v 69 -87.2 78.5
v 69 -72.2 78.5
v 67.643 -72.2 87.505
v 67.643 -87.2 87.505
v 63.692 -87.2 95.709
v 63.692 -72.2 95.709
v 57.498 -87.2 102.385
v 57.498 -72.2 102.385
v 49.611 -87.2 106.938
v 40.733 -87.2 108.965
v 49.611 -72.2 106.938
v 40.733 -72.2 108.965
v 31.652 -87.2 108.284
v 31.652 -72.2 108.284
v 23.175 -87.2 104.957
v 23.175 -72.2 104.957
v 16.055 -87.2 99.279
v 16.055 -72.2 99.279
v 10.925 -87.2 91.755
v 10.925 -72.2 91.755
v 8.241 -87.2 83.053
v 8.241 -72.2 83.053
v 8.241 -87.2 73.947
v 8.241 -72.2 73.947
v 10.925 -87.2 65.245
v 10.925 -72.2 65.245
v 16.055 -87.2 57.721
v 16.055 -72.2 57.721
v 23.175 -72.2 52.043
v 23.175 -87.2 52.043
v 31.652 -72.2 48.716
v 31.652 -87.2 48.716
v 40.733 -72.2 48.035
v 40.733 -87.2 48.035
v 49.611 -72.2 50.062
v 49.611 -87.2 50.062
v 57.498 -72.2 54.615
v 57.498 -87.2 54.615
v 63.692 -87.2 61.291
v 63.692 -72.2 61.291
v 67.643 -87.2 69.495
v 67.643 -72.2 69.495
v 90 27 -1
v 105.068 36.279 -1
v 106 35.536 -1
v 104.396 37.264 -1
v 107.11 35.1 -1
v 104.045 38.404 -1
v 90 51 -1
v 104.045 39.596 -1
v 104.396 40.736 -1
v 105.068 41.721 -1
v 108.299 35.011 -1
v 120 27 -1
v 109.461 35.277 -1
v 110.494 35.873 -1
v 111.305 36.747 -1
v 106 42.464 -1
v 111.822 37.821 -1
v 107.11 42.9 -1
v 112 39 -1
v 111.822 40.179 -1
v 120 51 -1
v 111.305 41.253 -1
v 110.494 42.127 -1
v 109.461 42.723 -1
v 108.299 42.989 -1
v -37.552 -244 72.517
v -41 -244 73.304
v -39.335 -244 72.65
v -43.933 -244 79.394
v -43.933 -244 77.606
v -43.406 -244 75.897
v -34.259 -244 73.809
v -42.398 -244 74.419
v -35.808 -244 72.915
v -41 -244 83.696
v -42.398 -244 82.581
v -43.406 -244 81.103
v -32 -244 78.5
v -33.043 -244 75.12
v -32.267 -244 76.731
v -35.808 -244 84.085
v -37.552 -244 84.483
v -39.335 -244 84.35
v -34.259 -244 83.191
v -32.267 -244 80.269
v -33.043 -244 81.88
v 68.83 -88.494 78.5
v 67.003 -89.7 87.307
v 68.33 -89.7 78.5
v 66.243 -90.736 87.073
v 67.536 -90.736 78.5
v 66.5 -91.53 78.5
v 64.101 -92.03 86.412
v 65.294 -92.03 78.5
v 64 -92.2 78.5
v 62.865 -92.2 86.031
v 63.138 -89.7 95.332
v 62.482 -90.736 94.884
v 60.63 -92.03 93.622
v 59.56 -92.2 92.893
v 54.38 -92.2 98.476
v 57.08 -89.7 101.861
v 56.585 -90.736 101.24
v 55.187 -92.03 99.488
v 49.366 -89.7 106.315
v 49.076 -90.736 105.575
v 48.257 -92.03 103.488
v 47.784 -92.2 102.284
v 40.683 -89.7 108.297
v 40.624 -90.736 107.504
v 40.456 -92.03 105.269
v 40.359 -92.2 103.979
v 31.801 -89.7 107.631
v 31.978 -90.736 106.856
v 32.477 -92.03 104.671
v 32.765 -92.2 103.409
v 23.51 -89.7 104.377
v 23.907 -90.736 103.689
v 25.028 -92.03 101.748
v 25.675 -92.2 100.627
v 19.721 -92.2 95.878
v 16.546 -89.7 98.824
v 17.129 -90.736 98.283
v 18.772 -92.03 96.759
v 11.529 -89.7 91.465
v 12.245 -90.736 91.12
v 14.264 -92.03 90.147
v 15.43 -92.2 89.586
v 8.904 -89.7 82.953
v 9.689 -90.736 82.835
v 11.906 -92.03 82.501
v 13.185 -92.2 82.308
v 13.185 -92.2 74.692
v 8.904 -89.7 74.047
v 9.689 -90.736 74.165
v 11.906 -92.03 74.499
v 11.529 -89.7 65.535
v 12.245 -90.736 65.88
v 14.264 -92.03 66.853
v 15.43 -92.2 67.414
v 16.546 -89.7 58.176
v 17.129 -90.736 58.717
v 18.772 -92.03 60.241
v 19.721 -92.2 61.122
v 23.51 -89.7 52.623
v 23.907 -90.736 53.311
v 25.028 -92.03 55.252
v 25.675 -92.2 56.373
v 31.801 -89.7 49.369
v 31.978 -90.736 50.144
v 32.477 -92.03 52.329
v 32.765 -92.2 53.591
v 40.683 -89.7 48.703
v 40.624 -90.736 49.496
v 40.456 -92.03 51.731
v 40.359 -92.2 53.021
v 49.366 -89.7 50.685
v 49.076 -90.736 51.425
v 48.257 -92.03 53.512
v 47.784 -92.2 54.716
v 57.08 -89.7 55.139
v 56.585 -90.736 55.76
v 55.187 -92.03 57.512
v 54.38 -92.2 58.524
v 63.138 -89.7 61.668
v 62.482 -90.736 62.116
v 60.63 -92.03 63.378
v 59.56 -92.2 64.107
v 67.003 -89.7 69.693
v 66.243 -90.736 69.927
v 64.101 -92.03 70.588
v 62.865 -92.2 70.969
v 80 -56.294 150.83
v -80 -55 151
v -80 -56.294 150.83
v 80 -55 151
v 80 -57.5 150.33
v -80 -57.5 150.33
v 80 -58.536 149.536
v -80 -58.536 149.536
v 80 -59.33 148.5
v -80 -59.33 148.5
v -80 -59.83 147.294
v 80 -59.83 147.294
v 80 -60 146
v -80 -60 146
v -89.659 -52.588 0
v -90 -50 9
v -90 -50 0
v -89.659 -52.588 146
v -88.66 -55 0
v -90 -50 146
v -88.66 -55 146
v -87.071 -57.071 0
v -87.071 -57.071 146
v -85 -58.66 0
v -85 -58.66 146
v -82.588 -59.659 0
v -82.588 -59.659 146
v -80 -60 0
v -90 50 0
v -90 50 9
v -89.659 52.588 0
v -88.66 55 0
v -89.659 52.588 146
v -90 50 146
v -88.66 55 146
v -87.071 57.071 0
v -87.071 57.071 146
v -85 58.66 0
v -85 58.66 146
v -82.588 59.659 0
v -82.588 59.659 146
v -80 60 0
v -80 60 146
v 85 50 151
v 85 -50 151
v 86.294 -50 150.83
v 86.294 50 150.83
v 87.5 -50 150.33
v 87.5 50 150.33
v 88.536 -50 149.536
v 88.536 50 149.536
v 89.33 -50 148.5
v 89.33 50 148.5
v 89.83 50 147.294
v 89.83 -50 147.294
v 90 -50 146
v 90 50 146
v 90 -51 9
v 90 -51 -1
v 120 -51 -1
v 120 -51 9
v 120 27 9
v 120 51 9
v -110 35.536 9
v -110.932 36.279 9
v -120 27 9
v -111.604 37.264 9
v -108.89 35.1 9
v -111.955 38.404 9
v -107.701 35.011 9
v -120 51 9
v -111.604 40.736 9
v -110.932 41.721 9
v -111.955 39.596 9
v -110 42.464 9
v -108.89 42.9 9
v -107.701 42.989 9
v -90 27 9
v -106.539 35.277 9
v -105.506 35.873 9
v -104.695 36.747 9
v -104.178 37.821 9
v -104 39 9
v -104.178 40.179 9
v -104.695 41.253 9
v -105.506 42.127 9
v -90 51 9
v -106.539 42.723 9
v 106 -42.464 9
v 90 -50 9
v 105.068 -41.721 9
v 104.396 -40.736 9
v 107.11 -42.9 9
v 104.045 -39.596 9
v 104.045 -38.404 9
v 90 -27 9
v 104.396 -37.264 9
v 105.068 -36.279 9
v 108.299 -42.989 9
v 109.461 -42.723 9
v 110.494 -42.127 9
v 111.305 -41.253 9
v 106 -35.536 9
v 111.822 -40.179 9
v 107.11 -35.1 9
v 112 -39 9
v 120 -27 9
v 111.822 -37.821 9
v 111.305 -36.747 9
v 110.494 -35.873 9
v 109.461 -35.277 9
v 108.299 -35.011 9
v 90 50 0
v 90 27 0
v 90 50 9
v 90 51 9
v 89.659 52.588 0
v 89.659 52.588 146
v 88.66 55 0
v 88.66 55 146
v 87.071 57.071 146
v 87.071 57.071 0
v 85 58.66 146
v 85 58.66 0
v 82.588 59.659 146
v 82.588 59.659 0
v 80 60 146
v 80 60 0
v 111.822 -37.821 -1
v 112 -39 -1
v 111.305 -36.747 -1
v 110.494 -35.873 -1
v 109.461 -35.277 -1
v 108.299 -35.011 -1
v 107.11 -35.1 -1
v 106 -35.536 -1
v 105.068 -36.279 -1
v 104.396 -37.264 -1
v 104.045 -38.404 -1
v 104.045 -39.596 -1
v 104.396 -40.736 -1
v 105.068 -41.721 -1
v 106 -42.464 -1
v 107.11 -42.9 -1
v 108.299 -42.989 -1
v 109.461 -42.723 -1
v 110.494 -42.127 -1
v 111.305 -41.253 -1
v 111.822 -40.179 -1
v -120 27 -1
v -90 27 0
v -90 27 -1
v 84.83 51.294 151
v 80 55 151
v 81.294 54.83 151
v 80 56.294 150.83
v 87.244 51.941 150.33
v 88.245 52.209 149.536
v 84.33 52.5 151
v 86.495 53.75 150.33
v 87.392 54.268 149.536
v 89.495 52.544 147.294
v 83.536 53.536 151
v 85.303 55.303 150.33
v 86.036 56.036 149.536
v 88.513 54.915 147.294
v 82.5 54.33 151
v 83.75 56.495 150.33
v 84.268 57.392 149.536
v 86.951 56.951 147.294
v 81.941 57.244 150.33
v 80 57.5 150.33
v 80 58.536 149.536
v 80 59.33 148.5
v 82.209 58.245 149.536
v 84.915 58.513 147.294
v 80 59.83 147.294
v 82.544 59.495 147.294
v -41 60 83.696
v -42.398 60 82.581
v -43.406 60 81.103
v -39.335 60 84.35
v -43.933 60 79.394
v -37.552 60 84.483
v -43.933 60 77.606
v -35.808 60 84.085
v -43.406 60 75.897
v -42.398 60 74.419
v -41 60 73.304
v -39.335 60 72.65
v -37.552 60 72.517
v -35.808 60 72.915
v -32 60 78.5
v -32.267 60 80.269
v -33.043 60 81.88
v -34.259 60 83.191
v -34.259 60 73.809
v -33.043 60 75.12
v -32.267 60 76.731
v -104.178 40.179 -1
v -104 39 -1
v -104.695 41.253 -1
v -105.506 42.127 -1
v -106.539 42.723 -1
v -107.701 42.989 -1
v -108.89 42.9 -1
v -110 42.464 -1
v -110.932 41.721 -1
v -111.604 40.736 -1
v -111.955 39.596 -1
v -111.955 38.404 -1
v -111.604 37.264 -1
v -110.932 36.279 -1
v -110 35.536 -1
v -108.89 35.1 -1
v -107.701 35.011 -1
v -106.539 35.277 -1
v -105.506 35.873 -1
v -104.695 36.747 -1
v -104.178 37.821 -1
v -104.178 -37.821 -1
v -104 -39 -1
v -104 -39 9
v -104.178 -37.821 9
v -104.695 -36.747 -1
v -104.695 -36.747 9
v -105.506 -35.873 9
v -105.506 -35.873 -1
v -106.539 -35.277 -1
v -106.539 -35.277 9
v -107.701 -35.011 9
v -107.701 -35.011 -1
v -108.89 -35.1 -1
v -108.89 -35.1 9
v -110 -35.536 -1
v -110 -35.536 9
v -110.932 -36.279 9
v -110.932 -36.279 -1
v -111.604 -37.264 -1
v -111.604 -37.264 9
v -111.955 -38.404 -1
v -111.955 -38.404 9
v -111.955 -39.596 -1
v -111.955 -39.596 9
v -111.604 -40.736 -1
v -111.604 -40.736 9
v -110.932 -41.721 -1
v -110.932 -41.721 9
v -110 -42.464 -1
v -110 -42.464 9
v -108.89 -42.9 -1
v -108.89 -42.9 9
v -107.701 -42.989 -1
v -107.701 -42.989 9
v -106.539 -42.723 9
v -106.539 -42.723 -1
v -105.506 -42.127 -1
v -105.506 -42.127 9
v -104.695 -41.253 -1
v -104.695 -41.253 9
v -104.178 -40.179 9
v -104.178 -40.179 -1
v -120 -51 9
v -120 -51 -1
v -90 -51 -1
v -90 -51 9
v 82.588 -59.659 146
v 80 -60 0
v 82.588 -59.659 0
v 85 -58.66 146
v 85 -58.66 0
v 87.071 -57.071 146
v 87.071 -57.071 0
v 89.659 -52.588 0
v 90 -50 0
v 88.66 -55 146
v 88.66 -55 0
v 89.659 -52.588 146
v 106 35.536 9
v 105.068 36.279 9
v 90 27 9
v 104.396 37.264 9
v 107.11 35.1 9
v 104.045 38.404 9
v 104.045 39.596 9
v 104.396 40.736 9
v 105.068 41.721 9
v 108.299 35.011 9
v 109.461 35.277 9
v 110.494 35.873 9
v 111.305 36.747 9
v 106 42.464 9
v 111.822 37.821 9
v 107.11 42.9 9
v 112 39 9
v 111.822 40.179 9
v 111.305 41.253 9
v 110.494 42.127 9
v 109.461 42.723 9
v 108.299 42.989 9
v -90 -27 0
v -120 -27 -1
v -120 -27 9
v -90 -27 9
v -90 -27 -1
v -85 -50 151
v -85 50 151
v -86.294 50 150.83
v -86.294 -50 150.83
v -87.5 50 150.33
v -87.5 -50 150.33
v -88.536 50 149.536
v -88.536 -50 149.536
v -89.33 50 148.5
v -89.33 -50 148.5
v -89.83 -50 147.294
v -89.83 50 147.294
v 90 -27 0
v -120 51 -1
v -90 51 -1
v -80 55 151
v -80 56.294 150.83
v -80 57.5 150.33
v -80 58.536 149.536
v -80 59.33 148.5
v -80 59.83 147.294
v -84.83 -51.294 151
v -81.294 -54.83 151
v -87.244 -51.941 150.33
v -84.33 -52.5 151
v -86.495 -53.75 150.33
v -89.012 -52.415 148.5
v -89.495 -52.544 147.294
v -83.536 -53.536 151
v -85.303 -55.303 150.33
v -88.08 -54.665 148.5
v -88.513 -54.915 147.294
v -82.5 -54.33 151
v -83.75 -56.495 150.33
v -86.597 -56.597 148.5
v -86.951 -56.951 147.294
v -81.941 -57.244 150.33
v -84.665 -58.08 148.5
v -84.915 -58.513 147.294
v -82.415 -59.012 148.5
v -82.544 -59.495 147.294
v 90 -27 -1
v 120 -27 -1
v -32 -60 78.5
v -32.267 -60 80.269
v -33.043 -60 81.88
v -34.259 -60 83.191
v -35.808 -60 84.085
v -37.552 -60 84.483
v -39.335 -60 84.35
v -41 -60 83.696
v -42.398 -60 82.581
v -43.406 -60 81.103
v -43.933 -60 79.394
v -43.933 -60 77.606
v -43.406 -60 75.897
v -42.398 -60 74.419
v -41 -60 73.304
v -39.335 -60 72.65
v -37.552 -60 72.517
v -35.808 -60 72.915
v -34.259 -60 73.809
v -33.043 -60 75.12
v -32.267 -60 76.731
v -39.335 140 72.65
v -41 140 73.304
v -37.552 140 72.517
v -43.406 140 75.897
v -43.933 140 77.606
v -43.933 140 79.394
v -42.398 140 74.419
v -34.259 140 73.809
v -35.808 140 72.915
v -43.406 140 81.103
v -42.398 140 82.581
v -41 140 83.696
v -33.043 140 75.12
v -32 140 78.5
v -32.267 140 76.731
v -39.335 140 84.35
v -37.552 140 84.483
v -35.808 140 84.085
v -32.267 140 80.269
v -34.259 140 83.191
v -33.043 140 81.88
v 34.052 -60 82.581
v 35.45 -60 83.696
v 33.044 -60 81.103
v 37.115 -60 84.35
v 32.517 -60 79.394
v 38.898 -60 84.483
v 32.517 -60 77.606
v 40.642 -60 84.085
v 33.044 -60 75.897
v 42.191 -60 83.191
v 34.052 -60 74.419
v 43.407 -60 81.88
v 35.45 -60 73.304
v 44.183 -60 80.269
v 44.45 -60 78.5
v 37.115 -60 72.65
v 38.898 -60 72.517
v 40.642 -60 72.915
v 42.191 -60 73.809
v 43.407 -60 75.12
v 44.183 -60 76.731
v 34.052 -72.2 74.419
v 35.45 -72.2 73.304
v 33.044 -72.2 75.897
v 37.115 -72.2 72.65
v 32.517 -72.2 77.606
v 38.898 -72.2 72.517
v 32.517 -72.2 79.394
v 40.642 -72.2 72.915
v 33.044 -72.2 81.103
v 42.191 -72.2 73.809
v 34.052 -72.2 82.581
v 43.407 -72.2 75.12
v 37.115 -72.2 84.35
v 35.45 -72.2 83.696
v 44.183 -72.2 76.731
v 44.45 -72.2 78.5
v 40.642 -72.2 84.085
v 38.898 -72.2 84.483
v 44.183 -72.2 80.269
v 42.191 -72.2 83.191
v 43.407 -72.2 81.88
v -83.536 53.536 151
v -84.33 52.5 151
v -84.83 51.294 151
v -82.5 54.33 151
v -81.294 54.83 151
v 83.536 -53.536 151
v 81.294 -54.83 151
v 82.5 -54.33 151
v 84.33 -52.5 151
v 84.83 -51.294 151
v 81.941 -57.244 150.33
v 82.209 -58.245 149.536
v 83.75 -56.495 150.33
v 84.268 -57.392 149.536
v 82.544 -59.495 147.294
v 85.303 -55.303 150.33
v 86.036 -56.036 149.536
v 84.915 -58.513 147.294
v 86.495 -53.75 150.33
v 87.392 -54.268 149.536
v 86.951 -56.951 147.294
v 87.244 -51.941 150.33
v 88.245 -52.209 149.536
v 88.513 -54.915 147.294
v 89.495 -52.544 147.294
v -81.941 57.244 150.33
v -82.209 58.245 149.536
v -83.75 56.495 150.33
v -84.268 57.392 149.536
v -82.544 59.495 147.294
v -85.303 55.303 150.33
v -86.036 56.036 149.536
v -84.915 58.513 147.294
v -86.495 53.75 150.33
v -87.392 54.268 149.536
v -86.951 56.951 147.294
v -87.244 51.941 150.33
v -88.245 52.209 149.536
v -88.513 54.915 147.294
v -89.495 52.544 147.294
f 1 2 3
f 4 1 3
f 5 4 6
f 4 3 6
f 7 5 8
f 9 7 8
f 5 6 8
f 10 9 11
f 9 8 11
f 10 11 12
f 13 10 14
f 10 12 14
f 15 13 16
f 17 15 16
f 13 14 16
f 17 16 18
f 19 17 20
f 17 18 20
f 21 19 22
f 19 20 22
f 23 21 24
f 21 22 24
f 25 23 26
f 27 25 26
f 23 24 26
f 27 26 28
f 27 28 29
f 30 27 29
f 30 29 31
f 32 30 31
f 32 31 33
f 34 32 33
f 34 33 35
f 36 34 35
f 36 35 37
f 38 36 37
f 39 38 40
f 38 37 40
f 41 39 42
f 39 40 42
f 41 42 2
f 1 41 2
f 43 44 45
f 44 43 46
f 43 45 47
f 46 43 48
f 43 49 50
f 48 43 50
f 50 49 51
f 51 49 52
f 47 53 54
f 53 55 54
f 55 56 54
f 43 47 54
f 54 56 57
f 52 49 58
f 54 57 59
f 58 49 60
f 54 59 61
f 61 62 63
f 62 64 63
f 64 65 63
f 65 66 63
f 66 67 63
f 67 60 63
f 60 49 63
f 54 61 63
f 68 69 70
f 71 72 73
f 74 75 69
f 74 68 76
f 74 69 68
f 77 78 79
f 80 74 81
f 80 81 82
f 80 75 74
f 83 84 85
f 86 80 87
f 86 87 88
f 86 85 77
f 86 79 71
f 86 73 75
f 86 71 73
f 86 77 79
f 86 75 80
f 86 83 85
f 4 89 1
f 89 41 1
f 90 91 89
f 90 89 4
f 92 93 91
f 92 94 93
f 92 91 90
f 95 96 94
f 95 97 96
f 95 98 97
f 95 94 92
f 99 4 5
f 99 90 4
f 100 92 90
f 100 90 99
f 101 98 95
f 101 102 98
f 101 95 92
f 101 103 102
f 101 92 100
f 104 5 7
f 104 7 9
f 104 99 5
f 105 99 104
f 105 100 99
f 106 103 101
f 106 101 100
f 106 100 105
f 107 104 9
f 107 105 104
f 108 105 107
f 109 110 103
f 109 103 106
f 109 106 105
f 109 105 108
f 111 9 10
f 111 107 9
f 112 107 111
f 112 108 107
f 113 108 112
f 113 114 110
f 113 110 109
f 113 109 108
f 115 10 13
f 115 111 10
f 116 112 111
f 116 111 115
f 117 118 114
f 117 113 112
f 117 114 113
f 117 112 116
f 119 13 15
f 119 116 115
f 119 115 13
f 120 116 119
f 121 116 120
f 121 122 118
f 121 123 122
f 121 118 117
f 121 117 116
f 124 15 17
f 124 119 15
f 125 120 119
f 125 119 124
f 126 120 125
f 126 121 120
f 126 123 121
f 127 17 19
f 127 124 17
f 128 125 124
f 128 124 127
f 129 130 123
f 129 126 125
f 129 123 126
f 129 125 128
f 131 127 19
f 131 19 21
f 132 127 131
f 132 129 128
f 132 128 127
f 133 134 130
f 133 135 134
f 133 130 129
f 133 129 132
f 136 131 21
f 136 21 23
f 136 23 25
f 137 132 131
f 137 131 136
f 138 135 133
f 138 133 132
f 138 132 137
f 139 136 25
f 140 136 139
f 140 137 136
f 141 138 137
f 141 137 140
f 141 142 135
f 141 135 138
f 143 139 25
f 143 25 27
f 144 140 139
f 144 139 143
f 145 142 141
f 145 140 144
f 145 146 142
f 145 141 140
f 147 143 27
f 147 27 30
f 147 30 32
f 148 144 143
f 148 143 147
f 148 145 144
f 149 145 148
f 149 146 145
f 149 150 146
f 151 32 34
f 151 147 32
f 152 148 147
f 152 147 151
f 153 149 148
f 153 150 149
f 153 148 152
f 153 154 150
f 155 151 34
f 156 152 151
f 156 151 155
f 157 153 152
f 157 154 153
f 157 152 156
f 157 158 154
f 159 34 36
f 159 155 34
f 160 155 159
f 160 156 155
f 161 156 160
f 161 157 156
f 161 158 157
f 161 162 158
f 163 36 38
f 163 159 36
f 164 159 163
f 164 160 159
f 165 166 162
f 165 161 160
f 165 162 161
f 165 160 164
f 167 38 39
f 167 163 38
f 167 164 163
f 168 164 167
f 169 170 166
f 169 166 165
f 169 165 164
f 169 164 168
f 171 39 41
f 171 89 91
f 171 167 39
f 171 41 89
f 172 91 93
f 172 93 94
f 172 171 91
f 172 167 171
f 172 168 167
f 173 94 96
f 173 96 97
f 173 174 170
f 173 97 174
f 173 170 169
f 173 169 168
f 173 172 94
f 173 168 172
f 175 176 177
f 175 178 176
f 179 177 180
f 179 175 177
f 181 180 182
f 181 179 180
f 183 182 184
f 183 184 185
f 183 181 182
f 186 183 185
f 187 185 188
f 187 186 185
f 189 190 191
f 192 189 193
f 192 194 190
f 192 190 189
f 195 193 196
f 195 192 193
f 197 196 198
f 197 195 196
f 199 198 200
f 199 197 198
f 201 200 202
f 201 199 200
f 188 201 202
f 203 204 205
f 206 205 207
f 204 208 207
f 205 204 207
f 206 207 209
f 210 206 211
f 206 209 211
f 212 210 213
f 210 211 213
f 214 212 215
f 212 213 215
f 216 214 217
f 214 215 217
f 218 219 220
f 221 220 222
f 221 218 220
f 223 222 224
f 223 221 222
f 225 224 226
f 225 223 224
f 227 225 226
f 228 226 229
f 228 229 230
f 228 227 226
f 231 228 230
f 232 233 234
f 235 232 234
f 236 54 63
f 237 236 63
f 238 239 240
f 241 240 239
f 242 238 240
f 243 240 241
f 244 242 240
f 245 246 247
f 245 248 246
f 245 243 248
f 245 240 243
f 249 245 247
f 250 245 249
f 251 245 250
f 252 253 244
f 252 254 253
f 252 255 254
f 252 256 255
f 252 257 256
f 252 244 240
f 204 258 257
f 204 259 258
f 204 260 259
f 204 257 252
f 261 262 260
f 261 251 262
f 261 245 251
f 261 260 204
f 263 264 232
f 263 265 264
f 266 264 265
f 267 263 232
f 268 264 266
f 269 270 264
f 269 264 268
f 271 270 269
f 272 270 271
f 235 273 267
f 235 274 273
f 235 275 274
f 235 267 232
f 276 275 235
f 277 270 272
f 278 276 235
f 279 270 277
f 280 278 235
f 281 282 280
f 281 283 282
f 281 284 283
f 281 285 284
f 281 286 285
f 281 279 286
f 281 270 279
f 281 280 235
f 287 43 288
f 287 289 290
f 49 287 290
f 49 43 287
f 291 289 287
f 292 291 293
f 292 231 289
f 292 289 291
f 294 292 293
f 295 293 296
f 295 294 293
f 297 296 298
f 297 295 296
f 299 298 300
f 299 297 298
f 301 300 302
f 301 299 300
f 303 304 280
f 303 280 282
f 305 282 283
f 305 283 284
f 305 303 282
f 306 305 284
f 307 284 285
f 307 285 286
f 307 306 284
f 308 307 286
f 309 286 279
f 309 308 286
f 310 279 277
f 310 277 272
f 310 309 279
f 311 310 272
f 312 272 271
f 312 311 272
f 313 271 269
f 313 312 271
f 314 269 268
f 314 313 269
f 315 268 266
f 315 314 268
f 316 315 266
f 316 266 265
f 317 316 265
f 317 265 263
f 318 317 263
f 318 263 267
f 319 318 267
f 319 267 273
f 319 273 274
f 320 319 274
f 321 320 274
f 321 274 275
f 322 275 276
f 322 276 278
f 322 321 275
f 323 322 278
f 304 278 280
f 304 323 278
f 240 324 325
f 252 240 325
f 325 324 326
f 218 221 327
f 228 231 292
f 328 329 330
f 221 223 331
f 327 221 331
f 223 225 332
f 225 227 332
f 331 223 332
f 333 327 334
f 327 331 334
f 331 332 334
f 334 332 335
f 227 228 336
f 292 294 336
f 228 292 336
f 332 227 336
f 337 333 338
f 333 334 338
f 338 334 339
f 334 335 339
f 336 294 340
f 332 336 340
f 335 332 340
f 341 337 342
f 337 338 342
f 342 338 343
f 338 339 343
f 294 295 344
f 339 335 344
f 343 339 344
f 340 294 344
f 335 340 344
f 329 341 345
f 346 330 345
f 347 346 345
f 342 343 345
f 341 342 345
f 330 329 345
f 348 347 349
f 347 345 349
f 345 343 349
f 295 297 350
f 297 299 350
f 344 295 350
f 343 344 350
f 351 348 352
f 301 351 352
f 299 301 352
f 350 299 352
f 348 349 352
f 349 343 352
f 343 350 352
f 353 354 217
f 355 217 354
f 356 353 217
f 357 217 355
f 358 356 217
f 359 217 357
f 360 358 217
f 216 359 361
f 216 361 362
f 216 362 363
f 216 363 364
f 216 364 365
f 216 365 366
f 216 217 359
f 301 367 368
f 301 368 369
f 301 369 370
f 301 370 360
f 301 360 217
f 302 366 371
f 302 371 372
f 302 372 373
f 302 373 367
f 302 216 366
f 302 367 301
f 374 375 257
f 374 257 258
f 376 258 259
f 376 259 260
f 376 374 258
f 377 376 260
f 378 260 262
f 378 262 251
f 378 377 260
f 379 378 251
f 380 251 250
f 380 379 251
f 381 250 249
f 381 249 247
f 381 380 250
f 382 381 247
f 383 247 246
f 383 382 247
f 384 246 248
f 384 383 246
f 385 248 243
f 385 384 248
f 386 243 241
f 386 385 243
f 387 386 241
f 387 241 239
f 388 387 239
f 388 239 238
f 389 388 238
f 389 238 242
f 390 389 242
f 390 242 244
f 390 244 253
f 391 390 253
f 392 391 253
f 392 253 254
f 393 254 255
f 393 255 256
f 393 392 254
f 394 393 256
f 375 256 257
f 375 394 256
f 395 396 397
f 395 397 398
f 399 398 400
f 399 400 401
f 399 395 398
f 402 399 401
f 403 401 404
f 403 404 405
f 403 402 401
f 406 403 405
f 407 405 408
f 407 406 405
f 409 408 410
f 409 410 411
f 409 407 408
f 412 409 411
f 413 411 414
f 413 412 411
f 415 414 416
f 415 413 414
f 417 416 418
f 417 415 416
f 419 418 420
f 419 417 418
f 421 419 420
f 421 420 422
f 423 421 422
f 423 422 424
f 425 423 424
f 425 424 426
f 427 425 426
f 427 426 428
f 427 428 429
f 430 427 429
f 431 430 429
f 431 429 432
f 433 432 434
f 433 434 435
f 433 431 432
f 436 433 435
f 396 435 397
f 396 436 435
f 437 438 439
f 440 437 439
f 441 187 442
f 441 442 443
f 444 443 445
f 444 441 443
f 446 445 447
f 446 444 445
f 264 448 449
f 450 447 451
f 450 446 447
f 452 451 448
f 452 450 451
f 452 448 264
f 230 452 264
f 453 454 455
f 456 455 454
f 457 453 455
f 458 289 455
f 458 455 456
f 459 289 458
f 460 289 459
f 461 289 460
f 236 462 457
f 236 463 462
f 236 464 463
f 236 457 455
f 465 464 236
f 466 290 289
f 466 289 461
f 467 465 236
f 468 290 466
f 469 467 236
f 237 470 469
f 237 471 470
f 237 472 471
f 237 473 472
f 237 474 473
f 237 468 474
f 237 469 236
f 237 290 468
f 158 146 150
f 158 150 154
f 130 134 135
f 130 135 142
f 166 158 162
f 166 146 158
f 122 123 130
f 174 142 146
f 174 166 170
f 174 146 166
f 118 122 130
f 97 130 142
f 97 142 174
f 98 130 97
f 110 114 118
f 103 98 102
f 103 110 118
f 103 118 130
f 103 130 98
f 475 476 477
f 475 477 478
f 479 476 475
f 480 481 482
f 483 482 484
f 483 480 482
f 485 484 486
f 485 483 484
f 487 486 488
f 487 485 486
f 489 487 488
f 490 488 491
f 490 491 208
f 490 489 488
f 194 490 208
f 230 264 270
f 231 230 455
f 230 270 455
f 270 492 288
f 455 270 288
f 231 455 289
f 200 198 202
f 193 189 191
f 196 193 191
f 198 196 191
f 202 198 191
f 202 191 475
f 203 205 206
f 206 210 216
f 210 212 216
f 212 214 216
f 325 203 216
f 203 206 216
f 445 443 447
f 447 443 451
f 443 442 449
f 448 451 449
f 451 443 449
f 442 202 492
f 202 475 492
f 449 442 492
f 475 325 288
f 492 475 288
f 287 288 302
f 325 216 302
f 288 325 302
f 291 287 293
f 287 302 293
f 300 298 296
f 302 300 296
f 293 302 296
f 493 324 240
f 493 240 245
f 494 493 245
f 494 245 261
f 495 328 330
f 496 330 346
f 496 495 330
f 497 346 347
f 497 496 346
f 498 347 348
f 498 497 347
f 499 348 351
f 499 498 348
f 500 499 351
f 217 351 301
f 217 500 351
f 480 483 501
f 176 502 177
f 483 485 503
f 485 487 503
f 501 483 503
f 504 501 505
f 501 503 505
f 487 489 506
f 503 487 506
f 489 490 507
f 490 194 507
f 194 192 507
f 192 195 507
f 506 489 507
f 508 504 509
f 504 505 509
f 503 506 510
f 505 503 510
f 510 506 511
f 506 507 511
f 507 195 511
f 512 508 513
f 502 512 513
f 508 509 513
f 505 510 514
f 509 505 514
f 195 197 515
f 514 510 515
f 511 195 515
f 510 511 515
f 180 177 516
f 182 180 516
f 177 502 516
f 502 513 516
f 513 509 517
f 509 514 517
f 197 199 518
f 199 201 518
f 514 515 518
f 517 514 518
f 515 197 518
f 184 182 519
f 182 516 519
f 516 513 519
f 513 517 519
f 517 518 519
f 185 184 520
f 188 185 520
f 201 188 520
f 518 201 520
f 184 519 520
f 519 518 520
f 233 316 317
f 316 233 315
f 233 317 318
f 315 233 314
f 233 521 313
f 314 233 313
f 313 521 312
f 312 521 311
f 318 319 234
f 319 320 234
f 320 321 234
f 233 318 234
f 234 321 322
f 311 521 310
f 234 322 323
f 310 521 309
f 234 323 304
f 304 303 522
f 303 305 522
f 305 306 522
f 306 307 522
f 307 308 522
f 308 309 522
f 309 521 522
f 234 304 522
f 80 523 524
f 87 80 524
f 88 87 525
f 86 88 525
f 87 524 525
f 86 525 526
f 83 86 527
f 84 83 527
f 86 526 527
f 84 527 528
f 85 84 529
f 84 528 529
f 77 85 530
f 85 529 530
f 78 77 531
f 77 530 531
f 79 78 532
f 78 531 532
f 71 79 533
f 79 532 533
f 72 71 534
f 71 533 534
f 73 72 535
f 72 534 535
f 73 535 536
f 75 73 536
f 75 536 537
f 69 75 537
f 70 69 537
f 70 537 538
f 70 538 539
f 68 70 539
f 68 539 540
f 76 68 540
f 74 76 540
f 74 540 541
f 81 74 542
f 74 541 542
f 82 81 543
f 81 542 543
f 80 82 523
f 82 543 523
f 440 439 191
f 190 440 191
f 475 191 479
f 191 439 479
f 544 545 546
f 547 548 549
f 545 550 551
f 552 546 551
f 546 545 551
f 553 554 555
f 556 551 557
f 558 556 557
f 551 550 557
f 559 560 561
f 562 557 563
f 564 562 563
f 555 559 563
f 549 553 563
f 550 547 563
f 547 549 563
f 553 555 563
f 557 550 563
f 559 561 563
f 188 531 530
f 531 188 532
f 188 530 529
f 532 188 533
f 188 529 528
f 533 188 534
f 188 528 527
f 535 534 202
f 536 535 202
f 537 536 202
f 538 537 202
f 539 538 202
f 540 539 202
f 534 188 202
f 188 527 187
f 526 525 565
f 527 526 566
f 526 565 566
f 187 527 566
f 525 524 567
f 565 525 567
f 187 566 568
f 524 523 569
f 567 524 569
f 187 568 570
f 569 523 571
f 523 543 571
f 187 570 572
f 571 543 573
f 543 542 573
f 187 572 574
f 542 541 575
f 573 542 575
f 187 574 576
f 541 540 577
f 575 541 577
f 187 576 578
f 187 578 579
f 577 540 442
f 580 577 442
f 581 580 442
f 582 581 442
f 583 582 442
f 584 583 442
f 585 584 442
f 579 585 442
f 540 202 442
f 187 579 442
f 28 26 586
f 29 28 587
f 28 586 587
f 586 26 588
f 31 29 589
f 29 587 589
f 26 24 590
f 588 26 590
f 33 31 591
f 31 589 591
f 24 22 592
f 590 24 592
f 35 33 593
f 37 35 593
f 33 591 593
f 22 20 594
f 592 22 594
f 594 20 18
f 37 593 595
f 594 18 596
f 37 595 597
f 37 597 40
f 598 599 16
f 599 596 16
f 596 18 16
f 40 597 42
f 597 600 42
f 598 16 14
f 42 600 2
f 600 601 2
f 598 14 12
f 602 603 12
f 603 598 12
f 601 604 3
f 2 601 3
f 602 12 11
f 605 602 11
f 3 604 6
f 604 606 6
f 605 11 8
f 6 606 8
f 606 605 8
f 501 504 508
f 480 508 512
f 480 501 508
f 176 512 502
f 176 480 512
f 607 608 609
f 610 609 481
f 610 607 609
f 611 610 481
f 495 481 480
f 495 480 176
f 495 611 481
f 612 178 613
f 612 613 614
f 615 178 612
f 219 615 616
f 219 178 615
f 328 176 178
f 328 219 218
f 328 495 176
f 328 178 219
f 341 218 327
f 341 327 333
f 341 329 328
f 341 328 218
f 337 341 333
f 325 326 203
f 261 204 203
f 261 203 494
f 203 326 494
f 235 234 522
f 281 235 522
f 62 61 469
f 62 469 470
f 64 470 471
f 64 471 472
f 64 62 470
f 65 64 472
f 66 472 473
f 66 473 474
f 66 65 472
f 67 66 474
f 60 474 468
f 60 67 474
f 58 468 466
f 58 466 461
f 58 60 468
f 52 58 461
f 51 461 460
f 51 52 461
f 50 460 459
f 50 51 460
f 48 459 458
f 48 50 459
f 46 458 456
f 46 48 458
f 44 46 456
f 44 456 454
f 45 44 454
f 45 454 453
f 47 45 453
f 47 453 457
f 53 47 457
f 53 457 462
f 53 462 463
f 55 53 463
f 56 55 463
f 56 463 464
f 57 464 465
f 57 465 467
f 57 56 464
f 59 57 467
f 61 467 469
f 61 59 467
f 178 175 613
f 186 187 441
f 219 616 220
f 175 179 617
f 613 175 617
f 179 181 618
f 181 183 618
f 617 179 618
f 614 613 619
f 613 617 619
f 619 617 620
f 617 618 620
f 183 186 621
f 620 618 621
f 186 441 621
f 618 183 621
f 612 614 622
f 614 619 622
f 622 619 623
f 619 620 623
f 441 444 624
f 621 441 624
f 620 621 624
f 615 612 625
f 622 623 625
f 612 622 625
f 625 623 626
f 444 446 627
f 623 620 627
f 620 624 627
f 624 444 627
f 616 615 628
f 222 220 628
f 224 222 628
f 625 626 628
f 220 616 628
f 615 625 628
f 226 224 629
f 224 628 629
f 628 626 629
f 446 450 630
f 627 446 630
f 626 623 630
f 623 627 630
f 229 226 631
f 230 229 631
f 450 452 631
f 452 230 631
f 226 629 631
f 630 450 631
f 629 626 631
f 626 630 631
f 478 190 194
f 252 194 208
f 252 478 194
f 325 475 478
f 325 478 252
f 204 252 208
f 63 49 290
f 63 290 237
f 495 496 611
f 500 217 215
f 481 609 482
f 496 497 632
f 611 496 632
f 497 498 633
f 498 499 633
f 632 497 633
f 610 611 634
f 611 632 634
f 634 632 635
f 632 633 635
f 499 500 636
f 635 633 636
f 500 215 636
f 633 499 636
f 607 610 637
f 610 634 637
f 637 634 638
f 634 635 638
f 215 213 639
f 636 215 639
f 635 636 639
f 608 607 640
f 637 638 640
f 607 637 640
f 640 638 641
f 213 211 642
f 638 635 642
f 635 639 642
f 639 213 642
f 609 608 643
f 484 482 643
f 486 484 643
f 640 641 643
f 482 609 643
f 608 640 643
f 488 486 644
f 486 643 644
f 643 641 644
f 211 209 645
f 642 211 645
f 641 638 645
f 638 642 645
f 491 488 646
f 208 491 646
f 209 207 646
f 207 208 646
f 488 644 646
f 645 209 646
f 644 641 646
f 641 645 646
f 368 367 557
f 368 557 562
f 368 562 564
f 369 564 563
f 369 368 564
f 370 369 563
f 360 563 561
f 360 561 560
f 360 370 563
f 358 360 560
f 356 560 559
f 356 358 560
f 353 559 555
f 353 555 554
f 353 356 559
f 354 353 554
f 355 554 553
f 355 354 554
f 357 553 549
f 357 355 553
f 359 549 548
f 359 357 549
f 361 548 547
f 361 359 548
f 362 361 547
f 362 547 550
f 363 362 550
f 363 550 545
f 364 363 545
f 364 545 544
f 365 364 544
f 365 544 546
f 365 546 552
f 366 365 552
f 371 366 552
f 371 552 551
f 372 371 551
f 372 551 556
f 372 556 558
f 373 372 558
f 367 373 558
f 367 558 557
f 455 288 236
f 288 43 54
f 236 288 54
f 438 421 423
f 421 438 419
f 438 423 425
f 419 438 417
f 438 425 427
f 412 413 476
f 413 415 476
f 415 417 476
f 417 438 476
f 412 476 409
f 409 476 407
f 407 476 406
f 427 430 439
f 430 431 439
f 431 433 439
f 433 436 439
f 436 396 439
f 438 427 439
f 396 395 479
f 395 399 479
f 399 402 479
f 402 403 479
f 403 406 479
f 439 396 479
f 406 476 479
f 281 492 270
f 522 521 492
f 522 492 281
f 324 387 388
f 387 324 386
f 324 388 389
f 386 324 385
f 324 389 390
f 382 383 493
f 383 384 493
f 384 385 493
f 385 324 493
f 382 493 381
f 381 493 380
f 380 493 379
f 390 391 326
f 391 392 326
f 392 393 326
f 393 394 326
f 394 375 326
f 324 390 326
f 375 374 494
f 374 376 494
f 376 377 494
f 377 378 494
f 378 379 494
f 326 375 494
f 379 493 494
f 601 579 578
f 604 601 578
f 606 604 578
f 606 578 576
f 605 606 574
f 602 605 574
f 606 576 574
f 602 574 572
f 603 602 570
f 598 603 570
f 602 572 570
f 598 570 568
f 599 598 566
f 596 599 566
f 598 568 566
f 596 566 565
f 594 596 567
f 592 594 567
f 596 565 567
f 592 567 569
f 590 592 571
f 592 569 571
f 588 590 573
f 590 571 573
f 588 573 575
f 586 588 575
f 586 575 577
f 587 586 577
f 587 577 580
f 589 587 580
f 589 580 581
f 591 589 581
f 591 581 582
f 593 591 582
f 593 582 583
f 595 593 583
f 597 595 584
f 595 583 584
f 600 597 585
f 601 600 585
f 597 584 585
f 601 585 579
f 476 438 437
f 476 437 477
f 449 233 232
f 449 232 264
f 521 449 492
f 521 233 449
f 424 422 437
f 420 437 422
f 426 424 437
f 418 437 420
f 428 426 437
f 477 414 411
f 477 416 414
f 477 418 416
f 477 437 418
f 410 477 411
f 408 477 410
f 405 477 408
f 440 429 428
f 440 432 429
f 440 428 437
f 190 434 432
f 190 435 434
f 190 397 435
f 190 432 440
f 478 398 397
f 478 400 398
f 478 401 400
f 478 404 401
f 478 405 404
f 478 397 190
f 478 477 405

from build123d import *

# Parameters (mm, degrees)
F0_W          = 180
F0_H          = 120
F1_DEPTH      = 151
F2_R          = 10
F3_R          = 5
F5_W          = 30
F5_H          = 24
F5_R          = 4
F6_DEPTH      = 10
F7_R          = 6
F8_DEPTH      = 12.2
F9_DEPTH      = 184
F9_DEPTH_BACK = 200
F10_R         = 30.55
F10_R_2       = 6
F11_DEPTH     = 20
F12_R         = 5


with BuildPart() as f1:
    # F0 (on Top) → F1 (new body)
    with BuildSketch(Plane.XY):
        Rectangle(F0_W, F0_H)
    extrude(amount=F1_DEPTH)

    # F2
    f2_edges = [f1.edges().sort_by_distance(p)[0] for p in [
        (-90, -60, 75.5),
        (90, -60, 75.5),
        (90, 60, 75.5),
        (-90, 60, 75.5),
    ]]
    fillet(f2_edges, radius=F2_R)

    # F3
    f3_edges = [f1.edges().sort_by_distance(p)[0] for p in [
        (0, -60, 151),
    ]]
    fillet(f3_edges, radius=F3_R)

    # F5 (on offset) → F6 (join)
    with BuildSketch(Plane.XY.offset(-1)):
        with Locations((105, 39)):
            Rectangle(F5_W, F5_H)
        with Locations((108, 39)):
            Circle(F5_R, mode=Mode.SUBTRACT)
        with Locations((105, -39)):
            Rectangle(F5_W, F5_H)
        with Locations((108, -39)):
            Circle(F5_R, mode=Mode.SUBTRACT)
        with Locations((-105, -39)):
            Rectangle(F5_W, F5_H)
        with Locations((-108, -39)):
            Circle(F5_R, mode=Mode.SUBTRACT)
        with Locations((-105, 39)):
            Rectangle(F5_W, F5_H)
        with Locations((-108, 39)):
            Circle(F5_R, mode=Mode.SUBTRACT)
    extrude(amount=F6_DEPTH)

    # F7 (on face) → F8 (join)
    with BuildSketch(Plane.XZ.offset(60)):
        with Locations((38.45, 78.5)):
            Circle(F7_R)
    extrude(amount=F8_DEPTH)

    # F7 (on face) → F9 (join, two sides)
    with BuildSketch(Plane.XZ.offset(60)) as f9_sk:
        with Locations((-38, 78.5)):
            Circle(F7_R)
    extrude(amount=F9_DEPTH)
    extrude(f9_sk.sketch, amount=-F9_DEPTH_BACK)

    # F10 (on face) → F11 (join)
    with BuildSketch(Plane.XZ.offset(72.2)):
        with Locations((38.45, 78.5)):
            Circle(F10_R)
        with Locations((38.45, 78.5)):
            Circle(F10_R_2, mode=Mode.SUBTRACT)
        with Locations((38.45, 78.5)):
            Circle(F10_R_2)
    extrude(amount=F11_DEPTH)

    # F12
    f12_edges = [f1.edges().sort_by_distance(p)[0] for p in [
        (7.9, -92.2, 78.5),
    ]]
    fillet(f12_edges, radius=F12_R)


solid = f1.part
